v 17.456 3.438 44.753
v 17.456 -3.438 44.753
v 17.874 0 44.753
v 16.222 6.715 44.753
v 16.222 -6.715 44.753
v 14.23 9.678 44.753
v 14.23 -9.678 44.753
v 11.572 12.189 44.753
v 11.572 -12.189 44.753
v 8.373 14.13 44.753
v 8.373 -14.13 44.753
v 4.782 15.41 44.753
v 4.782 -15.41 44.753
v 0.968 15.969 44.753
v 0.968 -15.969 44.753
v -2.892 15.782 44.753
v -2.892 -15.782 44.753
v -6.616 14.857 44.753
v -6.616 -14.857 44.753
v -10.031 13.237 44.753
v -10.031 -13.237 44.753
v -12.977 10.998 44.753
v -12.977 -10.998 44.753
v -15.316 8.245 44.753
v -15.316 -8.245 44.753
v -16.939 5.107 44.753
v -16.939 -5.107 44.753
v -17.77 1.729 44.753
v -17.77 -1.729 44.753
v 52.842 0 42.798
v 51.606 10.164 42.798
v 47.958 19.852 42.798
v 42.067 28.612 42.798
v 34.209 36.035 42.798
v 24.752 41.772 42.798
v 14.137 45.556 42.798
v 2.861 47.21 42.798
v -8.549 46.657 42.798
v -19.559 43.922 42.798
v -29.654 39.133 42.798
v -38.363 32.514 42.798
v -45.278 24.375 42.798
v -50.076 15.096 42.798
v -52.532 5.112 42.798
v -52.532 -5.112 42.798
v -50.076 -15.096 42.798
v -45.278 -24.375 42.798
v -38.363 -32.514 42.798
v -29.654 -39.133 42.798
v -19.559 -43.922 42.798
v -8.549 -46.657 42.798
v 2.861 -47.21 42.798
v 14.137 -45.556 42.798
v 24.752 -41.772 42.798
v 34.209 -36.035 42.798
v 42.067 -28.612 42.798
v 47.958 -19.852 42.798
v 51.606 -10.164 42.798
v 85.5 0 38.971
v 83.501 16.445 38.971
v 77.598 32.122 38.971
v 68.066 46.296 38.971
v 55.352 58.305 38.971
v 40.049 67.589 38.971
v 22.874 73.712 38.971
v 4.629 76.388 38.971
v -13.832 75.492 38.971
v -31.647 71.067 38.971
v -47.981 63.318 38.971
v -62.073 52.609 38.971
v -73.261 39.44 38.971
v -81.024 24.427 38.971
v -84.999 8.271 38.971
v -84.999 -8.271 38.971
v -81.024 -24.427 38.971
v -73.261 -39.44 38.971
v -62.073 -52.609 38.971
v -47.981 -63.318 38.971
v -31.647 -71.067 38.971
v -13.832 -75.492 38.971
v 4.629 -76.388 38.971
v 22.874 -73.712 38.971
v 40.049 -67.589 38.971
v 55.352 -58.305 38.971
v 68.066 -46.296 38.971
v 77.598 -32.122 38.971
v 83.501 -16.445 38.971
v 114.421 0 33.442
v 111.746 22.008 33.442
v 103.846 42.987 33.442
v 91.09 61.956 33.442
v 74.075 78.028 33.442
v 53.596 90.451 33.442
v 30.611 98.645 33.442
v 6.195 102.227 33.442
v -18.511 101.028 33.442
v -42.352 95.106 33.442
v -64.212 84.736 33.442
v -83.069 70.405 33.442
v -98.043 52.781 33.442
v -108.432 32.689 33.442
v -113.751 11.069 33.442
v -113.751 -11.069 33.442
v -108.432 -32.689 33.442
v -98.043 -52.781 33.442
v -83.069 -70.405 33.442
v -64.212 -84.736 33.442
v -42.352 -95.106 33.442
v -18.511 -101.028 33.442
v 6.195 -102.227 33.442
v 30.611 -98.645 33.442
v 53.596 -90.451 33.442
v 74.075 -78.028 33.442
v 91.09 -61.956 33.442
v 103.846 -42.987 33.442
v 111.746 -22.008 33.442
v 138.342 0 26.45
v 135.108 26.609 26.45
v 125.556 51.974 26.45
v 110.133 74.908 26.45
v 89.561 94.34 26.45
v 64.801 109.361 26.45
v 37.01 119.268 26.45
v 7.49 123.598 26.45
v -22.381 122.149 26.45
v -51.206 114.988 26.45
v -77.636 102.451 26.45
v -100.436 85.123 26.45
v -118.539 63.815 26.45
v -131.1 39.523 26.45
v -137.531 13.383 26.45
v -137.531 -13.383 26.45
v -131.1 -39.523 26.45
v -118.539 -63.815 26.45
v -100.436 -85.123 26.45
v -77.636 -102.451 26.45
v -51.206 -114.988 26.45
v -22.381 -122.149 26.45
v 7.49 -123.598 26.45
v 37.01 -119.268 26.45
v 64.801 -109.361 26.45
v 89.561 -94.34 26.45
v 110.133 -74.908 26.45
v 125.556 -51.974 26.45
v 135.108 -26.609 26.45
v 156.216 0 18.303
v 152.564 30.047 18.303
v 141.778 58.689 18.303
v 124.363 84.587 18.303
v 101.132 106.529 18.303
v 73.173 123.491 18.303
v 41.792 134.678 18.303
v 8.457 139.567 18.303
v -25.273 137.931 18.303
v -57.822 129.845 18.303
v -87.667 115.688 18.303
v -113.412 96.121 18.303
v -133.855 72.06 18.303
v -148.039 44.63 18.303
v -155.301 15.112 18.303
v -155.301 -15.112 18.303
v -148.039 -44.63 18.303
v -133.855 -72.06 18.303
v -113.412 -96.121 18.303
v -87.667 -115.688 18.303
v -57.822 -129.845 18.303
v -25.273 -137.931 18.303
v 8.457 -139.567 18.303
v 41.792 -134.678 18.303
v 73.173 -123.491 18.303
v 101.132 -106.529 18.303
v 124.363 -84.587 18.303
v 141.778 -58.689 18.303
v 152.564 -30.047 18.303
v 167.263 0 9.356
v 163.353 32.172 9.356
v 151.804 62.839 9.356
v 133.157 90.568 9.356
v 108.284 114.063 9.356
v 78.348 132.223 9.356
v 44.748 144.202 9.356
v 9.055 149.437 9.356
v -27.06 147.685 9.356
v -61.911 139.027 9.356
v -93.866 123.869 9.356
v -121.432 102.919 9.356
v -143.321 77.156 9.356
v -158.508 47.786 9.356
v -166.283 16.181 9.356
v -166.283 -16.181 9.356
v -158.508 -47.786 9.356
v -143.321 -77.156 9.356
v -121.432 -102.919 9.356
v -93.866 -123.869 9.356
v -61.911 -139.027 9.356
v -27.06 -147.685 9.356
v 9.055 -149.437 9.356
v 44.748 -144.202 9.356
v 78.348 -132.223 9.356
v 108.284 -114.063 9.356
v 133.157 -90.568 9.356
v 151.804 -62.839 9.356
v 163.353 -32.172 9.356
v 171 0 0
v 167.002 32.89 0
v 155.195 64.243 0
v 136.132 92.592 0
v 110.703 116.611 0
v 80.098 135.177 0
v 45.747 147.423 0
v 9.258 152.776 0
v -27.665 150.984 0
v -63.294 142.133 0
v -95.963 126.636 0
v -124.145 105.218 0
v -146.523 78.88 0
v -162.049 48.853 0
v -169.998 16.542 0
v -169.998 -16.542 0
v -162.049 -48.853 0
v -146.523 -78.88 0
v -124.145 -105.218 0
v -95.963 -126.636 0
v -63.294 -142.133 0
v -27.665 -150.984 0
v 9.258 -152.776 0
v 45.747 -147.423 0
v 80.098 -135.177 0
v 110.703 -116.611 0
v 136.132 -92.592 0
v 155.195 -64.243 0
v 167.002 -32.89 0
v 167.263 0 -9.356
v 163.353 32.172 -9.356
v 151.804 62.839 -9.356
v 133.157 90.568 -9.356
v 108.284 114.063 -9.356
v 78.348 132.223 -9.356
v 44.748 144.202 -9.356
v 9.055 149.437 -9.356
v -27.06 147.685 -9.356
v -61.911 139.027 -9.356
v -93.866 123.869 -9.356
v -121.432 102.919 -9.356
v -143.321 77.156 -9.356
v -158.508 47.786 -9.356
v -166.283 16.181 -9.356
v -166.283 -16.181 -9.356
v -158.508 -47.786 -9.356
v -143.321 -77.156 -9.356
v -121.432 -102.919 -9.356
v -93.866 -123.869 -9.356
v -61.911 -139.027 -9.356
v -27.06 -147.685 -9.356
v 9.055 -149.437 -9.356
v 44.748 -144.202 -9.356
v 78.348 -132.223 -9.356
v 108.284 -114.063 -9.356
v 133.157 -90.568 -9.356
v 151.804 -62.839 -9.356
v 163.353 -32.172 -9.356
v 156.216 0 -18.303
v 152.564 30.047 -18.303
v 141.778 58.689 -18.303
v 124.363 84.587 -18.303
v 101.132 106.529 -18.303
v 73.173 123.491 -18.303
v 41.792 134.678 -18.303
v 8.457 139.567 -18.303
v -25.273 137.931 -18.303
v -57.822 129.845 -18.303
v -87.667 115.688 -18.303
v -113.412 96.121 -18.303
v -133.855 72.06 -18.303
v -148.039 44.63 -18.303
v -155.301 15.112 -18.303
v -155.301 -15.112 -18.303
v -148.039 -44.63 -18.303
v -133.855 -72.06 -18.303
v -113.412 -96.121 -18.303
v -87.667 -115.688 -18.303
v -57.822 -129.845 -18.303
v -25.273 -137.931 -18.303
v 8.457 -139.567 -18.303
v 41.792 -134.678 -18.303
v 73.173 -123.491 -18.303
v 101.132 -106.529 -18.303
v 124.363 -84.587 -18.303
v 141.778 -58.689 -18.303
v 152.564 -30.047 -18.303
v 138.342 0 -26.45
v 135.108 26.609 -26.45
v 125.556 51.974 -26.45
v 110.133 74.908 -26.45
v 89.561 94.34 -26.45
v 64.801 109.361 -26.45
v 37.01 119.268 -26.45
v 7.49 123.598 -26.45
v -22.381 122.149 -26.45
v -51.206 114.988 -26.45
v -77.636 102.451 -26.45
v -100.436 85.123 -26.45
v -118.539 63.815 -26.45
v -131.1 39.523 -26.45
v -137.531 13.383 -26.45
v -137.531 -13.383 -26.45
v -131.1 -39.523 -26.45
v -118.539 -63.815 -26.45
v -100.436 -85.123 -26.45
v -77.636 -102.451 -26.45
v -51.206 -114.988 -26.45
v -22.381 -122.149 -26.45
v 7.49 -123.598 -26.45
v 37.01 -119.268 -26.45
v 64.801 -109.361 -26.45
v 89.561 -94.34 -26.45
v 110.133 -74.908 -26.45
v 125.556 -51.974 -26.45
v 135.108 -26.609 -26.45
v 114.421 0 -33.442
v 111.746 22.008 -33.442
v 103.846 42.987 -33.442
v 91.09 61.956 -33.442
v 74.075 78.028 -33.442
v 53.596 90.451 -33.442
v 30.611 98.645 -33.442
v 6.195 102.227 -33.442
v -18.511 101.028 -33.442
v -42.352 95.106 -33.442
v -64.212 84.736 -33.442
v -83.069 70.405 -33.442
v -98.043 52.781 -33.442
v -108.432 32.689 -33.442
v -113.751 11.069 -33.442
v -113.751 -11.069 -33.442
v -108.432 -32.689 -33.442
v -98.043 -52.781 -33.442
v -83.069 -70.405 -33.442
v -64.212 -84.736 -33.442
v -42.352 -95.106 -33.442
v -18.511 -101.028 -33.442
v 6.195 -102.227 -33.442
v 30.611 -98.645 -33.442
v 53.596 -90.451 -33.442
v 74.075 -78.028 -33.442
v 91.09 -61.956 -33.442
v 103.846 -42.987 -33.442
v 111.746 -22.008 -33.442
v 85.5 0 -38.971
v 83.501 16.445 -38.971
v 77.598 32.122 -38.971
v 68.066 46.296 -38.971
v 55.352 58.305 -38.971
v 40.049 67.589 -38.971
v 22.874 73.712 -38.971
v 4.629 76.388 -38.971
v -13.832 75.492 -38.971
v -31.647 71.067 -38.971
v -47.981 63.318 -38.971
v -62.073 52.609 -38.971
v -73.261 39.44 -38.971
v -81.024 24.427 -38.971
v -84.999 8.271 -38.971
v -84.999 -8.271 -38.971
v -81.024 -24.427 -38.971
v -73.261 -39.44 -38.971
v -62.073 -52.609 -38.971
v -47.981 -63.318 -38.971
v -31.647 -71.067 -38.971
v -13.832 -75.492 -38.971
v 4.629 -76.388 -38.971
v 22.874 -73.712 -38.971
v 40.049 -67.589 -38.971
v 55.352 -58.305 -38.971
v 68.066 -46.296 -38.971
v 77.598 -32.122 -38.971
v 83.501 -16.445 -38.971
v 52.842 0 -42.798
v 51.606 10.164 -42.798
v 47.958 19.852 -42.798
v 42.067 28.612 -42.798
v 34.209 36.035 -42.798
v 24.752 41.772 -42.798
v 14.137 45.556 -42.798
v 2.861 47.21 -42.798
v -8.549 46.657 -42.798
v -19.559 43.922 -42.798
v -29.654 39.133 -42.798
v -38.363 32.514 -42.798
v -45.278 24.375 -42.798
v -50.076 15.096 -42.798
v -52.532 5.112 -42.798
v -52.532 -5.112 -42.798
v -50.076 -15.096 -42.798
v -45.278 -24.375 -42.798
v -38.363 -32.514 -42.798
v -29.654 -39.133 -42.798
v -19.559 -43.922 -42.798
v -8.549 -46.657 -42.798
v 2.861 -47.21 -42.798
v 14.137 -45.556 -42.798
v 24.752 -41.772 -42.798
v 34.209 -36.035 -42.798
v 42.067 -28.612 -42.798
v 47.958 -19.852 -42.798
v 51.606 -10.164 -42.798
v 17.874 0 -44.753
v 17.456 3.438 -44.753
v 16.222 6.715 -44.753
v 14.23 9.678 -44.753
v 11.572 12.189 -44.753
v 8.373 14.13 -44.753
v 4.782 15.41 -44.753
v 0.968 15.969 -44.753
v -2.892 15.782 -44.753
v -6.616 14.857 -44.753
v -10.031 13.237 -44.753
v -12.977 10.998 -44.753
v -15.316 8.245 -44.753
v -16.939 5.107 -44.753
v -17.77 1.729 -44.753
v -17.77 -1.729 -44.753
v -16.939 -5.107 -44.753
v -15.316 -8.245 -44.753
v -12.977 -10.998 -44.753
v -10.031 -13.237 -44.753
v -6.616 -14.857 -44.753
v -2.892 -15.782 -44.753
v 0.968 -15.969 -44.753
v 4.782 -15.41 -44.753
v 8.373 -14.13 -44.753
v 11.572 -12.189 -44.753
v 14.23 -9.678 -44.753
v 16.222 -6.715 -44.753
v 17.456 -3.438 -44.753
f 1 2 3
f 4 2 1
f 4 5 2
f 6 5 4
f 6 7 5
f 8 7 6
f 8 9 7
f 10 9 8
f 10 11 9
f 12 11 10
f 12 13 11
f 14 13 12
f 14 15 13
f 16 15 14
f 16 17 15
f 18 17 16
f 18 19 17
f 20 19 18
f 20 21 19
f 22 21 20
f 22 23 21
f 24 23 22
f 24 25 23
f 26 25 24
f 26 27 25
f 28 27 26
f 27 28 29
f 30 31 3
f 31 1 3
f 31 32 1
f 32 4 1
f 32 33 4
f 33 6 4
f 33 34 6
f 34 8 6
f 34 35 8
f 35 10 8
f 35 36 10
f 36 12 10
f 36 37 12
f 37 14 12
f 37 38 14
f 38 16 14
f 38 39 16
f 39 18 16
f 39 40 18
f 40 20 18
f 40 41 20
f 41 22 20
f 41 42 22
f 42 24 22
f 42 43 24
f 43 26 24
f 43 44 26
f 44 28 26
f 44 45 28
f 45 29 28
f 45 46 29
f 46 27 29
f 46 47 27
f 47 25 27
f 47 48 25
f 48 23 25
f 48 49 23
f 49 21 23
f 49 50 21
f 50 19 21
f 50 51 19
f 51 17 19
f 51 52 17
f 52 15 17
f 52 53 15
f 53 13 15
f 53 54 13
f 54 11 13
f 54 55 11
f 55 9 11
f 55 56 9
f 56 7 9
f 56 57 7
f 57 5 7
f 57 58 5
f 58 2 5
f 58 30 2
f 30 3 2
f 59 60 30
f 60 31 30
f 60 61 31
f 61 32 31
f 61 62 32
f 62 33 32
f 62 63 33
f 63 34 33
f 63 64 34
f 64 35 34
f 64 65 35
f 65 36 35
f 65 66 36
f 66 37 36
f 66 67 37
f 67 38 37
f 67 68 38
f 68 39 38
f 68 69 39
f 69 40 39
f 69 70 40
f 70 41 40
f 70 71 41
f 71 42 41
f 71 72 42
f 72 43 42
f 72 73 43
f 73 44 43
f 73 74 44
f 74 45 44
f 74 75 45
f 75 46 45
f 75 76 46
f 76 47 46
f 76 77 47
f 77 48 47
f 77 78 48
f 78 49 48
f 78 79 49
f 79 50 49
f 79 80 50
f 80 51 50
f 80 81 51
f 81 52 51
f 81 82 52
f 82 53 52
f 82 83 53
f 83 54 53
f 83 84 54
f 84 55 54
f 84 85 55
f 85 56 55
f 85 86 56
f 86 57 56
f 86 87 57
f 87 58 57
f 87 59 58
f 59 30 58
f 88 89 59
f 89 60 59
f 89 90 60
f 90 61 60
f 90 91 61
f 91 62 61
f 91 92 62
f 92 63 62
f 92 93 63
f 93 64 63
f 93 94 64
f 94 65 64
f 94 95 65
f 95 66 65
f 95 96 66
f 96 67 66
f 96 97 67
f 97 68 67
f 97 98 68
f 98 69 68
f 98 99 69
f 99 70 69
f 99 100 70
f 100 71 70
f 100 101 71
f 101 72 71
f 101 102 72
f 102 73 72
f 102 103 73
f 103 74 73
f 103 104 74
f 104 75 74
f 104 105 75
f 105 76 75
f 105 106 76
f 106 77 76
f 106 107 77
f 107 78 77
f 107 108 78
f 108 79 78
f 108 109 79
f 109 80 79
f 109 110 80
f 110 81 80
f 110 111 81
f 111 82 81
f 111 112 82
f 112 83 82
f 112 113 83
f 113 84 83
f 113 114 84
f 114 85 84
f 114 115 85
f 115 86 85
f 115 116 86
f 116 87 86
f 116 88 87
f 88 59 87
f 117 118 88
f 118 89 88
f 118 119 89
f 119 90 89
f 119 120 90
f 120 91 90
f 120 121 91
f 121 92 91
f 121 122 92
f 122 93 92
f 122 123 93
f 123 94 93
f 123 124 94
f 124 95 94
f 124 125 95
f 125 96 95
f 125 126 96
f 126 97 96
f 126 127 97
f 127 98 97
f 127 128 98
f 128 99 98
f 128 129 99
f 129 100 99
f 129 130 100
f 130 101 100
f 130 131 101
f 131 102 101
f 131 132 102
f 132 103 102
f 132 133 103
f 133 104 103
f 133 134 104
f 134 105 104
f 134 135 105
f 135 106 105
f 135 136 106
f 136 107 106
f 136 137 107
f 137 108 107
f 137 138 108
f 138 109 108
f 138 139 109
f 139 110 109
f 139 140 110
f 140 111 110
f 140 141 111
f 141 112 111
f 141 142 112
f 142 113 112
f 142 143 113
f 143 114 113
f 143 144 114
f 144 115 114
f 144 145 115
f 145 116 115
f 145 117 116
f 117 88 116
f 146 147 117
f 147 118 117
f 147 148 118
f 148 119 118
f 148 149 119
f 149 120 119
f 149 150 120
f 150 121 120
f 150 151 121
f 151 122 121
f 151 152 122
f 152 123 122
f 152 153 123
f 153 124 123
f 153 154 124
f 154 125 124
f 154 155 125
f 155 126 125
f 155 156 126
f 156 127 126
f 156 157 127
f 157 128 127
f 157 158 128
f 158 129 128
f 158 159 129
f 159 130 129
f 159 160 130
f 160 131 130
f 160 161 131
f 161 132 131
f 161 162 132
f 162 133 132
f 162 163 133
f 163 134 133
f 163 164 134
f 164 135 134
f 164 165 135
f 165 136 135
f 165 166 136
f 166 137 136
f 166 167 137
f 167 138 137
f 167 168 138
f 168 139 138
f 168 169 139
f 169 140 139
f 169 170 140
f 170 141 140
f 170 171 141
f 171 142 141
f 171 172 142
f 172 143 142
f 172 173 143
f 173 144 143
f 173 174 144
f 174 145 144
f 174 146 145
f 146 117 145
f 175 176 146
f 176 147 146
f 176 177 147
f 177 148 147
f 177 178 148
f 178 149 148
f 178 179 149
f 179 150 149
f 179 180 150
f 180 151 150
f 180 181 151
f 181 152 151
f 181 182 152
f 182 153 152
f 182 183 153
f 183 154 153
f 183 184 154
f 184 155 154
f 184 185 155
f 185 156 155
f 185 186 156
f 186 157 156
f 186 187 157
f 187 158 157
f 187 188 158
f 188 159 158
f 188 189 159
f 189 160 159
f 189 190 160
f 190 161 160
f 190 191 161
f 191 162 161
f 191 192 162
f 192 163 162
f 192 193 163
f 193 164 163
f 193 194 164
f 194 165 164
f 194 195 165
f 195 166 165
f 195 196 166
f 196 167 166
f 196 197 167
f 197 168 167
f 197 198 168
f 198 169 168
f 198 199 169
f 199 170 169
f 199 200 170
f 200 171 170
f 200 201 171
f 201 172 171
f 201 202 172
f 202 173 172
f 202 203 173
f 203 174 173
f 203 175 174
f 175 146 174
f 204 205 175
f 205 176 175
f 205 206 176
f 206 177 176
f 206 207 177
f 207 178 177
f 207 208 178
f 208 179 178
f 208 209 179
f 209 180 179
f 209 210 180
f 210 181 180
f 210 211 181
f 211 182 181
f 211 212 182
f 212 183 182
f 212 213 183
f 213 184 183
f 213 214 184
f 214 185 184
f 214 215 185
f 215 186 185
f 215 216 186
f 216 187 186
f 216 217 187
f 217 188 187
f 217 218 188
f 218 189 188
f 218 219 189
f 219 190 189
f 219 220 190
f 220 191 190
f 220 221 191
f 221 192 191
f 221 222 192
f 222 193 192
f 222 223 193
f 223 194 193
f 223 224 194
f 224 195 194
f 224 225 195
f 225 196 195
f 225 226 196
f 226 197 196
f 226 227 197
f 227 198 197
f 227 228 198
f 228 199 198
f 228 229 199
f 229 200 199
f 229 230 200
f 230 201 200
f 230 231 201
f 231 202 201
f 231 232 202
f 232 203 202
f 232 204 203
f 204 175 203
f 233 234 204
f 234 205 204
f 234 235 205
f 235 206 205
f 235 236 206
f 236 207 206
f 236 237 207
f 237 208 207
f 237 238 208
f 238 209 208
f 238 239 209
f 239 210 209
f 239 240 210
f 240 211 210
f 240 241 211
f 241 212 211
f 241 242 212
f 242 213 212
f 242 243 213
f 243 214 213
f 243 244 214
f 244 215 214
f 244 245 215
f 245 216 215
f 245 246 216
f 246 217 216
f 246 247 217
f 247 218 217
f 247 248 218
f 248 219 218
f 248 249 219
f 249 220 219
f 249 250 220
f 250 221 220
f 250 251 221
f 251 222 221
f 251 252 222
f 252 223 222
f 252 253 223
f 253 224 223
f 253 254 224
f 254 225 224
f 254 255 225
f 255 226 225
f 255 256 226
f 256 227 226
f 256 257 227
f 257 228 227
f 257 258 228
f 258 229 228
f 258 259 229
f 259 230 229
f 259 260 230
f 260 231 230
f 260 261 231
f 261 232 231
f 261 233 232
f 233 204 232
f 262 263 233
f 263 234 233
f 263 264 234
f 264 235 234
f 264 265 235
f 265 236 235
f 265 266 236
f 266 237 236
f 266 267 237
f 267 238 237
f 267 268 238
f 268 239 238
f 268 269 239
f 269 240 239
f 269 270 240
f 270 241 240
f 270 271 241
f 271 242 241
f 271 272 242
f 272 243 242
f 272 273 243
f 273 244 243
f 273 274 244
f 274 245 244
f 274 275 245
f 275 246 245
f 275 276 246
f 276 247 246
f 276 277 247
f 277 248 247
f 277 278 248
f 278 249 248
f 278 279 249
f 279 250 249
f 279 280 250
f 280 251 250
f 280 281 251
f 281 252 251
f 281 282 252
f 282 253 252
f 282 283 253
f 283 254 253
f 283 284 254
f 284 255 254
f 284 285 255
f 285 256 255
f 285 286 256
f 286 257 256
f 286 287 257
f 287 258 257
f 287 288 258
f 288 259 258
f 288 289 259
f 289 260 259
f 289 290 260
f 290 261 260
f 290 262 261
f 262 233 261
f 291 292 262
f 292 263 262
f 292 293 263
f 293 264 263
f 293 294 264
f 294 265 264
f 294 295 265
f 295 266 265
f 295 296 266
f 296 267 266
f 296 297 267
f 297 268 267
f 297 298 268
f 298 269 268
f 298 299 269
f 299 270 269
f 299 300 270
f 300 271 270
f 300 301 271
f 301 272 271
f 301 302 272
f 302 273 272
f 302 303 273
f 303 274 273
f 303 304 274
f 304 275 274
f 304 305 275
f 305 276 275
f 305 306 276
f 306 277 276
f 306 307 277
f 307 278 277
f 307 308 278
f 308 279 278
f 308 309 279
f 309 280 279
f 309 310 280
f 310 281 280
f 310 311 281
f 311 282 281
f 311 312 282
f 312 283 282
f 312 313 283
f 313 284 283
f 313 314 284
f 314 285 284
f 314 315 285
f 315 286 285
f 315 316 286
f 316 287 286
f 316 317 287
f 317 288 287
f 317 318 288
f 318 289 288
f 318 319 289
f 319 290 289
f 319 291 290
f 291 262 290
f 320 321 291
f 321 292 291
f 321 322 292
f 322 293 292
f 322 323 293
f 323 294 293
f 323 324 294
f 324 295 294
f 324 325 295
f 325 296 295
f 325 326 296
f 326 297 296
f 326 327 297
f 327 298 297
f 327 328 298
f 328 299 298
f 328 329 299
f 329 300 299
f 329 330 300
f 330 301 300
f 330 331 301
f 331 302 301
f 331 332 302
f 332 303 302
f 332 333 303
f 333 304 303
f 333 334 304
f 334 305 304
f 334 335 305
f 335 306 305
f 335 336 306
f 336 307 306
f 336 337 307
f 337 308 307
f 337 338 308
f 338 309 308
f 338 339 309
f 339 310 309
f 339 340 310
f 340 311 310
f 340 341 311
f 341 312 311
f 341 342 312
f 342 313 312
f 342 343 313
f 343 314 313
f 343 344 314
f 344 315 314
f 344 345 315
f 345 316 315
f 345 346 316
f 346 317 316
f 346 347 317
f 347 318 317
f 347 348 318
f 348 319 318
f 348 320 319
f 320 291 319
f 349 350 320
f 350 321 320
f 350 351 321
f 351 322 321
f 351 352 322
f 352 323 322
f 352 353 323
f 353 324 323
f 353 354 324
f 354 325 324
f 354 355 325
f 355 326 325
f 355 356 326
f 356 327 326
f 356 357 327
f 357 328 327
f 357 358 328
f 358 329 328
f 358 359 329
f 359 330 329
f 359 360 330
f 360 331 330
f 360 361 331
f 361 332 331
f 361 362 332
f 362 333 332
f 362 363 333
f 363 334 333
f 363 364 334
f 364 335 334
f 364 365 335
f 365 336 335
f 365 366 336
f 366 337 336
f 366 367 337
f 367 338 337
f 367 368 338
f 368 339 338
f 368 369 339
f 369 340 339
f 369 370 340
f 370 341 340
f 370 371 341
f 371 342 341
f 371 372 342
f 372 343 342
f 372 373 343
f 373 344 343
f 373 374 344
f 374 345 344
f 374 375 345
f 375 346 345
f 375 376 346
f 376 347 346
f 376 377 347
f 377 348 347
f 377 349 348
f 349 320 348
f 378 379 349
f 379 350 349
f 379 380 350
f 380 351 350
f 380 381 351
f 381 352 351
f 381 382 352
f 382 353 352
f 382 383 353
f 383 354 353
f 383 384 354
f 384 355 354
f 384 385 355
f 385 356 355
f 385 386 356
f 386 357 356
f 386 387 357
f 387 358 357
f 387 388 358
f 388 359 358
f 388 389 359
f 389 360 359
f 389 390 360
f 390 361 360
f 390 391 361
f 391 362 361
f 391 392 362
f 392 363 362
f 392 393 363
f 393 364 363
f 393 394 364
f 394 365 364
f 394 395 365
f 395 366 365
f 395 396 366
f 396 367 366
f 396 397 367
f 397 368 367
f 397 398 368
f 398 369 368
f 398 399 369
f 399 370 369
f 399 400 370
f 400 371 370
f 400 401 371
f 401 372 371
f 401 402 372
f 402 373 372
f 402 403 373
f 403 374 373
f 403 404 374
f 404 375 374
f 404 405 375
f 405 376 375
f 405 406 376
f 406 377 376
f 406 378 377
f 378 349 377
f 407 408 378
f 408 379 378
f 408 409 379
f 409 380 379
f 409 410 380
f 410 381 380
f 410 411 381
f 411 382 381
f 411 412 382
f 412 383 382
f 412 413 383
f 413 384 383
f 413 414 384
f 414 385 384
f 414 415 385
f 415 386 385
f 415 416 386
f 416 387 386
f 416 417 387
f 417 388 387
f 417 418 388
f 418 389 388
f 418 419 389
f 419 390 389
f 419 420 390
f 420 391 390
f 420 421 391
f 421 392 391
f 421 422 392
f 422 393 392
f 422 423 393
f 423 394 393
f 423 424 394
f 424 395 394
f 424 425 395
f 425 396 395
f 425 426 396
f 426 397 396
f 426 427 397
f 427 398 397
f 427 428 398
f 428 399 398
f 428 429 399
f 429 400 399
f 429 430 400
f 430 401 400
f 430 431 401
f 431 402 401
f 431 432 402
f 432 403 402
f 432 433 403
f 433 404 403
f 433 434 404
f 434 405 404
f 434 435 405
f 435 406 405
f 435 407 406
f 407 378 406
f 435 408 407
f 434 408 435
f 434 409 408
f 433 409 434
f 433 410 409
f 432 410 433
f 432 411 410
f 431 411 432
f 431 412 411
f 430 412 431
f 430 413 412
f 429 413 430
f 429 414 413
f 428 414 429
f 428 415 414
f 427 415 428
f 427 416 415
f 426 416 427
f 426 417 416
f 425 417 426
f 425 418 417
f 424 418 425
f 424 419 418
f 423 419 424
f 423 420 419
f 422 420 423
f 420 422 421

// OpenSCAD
// Generated by SolidPython 1.0.1 on 2020-07-29 00:46:54


scale(v = [19, 17, 5]) {
	sphere(r = 9);
}
/***********************************************
*********      SolidPython code:      **********
************************************************
 
# import packages: SolidPython
from solid import *
from solid.utils import *
from itertools import chain, combinations, permutations


class Resize:

    def __init__(self, scad_file):
        self.scad_file = scad_file
        #self.scad_file = import_scad(scad_file)
        # cone/cylinder param:
        self.r1 = 0
        self.r2 = 0
        self.h = 0
        # rectangular prism param:
        self.w = 0
        self.l = 0
        # ellipse param:
        self.r = 0

    # import OpenScad code (file name corresponds to shape)


    # classify shape + parameters
    def assign(self, param1, param2, param3):
        if self.scad_file == 'cone.scad':
            self.r1 = param1
            self.r2 = param2
            self.h = param3
        elif self.scad_file == 'cylinder.scad':
            self.r1 = param1
            self.r2 = param2
            self.h = param3
        elif self.scad_file == 'rectangularPrism.scad':
            self.h = param1
            self.l = param2
            self.w = param3
        else:
            self.r = param1
            self.h = param2

    # resize parameters
    def iterate(self):
        x = range(3, 20, 2)
        i = 1
        if self.scad_file == 'cone.scad':
            tempList = list(permutations(x, 2))
            for temp in tempList:
                param1 = temp[0]
                param2 = temp[1]
                filepath = 'produced_scad_files/' + 'cone' + str(param1) + '_' + str(param2) + '_' + '.scad'
                scad_render_to_file(cylinder(h=param1, r1=param2, r2=0), filepath)

        elif self.scad_file == 'cylinder.scad':
            tempList = list(permutations(x, 3))
            for temp in tempList:
                param1 = temp[0]
                param2 = temp[1]
                filepath = 'produced_scad_files/' + 'cylinder' + str(param1) + '_' + str(param2) + '_' + '.scad'
                scad_render_to_file(cylinder(h=param1, r1=param2, r2=param2), filepath)

        elif self.scad_file == 'rectangularPrism.scad':
            tempList = list(permutations(x, 3))
            for temp in tempList:
                param1 = temp[0]
                param2 = temp[1]
                param3 = temp[2]
                filepath = 'produced_scad_files/' + 'rectangularPrism' + str(param1) + '_' + str(param2) + '_' + str(
                    param3) + '.scad'
                scad_render_to_file(cube(size=(param1, param2, param3)), filepath)

        elif self.scad_file == 'ellipse.scad':
            tempList = list(permutations(x, 4))
            for temp in tempList:
                param1 = temp[0]
                param2 = temp[1]
                param3 = temp[2]
                param4 = temp[3]
                filepath = 'produced_scad_files/' + 'ellipse' + str(param1) + '_' + str(param2) + '_' + str(param3) + '_' + str(param4) + '.scad'
                scad_render_to_file(scale([param1, param2, param3])(sphere(r=param4)), filepath)

    def render_to_scadfile(self):
        scad_render_to_file(scad, 'example.scad') 
 
************************************************/
